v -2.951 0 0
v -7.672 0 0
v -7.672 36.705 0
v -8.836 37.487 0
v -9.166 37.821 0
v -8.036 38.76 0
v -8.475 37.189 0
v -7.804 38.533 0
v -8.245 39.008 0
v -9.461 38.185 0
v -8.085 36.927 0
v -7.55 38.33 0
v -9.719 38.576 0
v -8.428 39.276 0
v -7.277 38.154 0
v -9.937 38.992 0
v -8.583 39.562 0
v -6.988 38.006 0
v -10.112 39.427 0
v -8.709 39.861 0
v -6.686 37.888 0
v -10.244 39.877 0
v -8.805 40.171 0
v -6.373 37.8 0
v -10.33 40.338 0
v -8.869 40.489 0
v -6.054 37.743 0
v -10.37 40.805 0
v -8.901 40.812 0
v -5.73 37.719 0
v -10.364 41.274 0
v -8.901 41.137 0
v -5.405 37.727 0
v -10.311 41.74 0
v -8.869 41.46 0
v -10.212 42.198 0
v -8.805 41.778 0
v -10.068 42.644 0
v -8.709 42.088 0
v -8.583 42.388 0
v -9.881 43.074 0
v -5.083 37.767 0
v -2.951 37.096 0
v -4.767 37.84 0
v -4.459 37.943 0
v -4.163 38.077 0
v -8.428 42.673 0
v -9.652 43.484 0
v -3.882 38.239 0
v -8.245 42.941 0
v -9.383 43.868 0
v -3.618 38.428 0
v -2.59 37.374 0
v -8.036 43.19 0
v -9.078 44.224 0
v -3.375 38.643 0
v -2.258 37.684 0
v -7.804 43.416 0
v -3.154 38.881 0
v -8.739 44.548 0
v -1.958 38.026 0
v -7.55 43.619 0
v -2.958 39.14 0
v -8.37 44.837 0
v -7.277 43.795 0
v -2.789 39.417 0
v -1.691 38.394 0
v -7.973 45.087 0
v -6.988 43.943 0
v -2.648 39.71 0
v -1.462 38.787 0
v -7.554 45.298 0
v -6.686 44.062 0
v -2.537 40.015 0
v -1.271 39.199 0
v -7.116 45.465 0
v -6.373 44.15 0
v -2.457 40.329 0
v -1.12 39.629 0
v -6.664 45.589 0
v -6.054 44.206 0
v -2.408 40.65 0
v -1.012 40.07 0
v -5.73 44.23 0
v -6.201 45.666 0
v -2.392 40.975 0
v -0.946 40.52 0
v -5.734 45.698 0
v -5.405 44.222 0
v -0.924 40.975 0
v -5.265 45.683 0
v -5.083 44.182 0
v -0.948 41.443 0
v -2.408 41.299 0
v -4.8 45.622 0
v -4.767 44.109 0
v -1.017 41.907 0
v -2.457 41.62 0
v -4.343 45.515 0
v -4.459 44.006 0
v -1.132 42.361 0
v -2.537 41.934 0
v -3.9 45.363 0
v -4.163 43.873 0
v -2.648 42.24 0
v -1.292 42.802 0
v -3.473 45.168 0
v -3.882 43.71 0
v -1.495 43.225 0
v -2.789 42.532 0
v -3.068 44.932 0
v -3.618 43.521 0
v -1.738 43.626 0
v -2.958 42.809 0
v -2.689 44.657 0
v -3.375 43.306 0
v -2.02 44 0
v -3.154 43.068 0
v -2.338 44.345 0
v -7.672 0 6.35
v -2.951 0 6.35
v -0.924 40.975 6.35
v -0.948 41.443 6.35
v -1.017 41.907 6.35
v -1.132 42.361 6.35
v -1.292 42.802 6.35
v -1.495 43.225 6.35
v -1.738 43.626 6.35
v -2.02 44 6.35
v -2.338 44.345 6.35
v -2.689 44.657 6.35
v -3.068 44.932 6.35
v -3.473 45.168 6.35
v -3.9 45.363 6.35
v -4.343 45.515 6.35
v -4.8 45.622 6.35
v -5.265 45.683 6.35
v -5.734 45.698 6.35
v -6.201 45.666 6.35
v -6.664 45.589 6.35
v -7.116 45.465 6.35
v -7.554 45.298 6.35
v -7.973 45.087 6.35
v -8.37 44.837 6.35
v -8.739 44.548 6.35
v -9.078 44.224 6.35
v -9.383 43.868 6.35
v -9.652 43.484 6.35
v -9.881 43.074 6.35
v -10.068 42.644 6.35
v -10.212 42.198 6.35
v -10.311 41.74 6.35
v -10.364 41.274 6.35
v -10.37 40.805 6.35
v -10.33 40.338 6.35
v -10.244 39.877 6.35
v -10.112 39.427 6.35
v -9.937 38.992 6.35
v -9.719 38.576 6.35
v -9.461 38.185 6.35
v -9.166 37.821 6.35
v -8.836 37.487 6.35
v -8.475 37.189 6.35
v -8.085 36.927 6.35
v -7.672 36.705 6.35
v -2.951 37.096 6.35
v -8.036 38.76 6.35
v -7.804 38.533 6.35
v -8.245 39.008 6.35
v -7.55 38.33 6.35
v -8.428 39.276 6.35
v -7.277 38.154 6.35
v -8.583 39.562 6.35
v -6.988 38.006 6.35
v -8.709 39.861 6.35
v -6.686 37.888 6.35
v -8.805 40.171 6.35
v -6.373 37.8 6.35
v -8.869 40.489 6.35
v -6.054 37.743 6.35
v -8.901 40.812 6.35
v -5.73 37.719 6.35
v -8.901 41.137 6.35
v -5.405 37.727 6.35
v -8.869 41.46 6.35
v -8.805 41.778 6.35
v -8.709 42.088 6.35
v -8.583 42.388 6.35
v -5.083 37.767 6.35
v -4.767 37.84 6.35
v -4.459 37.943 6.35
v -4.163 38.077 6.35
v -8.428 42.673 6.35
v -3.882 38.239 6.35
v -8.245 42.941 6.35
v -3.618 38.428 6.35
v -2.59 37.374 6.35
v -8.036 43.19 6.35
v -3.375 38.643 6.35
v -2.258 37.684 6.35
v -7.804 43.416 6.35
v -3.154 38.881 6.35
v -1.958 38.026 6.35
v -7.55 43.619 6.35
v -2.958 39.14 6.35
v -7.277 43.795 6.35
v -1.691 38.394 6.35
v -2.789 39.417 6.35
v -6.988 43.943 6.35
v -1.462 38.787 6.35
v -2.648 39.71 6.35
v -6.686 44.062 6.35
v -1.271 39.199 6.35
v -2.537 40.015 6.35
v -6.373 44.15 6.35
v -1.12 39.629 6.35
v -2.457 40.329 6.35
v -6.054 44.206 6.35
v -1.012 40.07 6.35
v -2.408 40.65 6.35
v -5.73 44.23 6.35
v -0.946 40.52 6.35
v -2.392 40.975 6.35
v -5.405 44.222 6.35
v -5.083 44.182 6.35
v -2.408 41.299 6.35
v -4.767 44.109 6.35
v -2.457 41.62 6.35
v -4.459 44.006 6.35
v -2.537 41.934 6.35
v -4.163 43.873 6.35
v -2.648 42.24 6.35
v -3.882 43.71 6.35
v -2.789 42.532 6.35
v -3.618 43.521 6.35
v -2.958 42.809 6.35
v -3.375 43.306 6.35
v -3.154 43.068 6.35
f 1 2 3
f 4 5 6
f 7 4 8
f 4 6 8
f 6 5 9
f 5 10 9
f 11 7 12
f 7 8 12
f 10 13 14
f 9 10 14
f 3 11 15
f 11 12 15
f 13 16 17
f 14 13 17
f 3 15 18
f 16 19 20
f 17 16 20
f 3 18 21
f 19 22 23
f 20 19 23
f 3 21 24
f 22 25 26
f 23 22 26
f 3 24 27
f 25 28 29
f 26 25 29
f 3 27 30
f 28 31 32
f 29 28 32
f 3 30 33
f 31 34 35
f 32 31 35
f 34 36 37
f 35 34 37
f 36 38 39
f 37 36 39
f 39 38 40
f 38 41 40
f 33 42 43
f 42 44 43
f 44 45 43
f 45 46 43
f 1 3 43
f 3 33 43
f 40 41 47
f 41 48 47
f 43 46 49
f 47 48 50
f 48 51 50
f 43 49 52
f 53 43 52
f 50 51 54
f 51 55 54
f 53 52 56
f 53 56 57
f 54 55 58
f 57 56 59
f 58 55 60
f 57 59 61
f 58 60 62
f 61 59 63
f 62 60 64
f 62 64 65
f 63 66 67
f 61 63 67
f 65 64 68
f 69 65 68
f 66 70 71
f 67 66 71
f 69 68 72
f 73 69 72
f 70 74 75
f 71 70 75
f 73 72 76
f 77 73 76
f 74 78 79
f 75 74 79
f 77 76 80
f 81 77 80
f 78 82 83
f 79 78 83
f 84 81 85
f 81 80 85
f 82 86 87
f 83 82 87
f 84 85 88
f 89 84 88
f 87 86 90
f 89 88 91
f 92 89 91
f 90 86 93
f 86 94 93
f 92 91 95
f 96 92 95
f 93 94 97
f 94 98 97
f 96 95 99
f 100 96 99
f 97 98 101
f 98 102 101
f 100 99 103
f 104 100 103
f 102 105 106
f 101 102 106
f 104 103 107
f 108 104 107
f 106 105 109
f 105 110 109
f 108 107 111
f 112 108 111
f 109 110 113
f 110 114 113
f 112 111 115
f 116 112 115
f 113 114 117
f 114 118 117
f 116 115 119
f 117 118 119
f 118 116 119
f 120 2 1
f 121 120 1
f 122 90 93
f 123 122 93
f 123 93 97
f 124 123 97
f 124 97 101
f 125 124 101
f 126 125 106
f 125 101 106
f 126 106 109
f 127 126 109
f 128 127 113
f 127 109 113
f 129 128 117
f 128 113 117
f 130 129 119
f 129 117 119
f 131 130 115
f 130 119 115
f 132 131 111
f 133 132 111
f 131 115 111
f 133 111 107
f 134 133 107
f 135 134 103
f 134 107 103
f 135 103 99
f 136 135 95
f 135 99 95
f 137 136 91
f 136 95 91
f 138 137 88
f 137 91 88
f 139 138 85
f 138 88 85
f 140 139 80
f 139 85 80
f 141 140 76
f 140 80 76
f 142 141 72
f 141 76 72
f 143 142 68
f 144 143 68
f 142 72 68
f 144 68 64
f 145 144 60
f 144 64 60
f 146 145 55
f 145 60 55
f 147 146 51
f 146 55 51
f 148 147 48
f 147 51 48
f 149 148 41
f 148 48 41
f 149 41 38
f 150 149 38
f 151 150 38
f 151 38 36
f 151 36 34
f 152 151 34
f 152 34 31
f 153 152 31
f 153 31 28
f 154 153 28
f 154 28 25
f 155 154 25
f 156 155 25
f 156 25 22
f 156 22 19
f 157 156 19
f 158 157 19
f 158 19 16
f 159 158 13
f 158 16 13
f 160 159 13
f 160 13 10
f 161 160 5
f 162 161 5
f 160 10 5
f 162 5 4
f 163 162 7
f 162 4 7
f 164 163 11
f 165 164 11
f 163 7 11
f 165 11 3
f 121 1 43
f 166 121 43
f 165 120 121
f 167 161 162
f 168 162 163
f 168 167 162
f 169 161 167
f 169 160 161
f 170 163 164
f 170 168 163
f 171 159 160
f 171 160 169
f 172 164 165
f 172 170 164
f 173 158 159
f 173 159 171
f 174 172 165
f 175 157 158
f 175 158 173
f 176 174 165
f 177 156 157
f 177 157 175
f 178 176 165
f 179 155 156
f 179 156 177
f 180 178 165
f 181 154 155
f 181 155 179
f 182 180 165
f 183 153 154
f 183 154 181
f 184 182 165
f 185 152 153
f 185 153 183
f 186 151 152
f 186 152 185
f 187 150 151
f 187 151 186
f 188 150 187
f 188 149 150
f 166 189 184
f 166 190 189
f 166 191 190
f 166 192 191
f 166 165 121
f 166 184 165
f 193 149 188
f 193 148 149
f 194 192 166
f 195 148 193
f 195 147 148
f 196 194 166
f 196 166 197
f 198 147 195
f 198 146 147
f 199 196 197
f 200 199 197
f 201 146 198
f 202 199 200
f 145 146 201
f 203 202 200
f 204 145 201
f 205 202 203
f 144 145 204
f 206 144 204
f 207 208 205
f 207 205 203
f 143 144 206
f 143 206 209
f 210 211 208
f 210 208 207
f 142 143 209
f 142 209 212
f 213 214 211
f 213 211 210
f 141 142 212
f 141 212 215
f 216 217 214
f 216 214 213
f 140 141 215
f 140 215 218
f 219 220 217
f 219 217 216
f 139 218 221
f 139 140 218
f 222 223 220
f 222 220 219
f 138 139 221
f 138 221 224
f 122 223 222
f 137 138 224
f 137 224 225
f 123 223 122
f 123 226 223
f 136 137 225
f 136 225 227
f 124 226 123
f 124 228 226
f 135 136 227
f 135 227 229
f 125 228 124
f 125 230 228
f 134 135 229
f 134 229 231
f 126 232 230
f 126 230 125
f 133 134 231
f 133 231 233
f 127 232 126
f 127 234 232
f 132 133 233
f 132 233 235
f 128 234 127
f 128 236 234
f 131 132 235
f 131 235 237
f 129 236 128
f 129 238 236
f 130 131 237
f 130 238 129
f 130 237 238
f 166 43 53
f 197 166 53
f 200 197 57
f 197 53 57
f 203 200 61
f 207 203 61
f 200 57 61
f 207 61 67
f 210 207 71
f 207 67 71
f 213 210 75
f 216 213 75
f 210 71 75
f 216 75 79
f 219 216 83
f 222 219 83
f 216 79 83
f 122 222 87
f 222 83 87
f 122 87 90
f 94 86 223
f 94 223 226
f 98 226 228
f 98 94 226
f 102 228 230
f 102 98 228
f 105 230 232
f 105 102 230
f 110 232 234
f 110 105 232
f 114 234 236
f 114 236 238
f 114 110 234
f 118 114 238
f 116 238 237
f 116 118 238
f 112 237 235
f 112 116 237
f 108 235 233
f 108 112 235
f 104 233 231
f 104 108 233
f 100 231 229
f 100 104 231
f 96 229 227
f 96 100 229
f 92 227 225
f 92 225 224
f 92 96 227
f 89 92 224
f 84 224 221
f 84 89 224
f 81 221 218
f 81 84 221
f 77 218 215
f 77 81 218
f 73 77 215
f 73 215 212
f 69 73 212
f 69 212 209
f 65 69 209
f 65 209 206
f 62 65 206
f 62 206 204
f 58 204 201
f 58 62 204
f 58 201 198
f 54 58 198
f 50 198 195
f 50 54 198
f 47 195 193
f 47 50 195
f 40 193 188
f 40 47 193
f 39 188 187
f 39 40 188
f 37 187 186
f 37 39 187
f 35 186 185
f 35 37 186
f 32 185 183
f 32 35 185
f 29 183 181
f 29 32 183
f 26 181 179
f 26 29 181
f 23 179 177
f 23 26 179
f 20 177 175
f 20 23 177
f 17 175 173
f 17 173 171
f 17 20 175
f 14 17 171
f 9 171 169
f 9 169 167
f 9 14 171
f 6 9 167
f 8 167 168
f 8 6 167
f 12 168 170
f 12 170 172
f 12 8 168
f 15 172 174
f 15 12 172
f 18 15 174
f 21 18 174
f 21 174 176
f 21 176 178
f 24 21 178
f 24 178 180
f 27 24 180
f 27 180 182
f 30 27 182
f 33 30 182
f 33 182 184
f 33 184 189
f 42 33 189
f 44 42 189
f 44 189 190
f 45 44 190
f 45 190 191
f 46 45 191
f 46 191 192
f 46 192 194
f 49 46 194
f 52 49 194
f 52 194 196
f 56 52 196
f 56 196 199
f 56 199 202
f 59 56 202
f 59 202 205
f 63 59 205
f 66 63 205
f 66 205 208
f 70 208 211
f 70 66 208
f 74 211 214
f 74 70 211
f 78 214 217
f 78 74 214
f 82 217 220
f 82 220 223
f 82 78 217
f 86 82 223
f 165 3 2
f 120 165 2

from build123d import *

# Parameters (mm, degrees)
F0_R     = 3.2565865512
F1_DEPTH = 6.35


with BuildPart() as f1:
    # F0 (on Top) → F1 (new body)
    with BuildSketch(Plane.XY):
        with BuildLine():
            Line((-7.6721920632, 36.7054540553), (-7.6721920632, 37.0963104069))
            Line((-7.6721920632, 37.0963104069), (-2.9508429579, 37.0963104069))
            ThreePointArc((-2.9508429579, 37.0963104069), (-1.4615430474, 38.7866806162), (-0.9243947942, 40.9745648503))
            ThreePointArc((-0.9243947942, 40.9745648503), (-8.174638541, 44.9669975349), (-7.6721920632, 36.7054540553))
        make_face()
        with Locations((-5.6487568654, 40.9745648503)):
            Circle(F0_R, mode=Mode.SUBTRACT)
        with BuildLine():
            Line((-2.9508429579, 37.0963104069), (-7.6721920632, 37.0963104069))
            Line((-7.6721920632, 37.0963104069), (-7.6721920632, 36.7054540553))
            ThreePointArc((-7.6721920632, 36.7054540553), (-5.2589844262, 36.2663088648), (-2.9508429579, 37.0963104069))
        make_face()
        with BuildLine():
            Line((-2.9508429579, 0), (-2.9508429579, 37.0963104069))
            ThreePointArc((-2.9508429579, 37.0963104069), (-5.2589844262, 36.2663088648), (-7.6721920632, 36.7054540553))
            Line((-7.6721920632, 36.7054540553), (-7.6721920632, 0))
            Line((-7.6721920632, 0), (-2.9508429579, 0))
        make_face()
    extrude(amount=F1_DEPTH)


solid = f1.part
